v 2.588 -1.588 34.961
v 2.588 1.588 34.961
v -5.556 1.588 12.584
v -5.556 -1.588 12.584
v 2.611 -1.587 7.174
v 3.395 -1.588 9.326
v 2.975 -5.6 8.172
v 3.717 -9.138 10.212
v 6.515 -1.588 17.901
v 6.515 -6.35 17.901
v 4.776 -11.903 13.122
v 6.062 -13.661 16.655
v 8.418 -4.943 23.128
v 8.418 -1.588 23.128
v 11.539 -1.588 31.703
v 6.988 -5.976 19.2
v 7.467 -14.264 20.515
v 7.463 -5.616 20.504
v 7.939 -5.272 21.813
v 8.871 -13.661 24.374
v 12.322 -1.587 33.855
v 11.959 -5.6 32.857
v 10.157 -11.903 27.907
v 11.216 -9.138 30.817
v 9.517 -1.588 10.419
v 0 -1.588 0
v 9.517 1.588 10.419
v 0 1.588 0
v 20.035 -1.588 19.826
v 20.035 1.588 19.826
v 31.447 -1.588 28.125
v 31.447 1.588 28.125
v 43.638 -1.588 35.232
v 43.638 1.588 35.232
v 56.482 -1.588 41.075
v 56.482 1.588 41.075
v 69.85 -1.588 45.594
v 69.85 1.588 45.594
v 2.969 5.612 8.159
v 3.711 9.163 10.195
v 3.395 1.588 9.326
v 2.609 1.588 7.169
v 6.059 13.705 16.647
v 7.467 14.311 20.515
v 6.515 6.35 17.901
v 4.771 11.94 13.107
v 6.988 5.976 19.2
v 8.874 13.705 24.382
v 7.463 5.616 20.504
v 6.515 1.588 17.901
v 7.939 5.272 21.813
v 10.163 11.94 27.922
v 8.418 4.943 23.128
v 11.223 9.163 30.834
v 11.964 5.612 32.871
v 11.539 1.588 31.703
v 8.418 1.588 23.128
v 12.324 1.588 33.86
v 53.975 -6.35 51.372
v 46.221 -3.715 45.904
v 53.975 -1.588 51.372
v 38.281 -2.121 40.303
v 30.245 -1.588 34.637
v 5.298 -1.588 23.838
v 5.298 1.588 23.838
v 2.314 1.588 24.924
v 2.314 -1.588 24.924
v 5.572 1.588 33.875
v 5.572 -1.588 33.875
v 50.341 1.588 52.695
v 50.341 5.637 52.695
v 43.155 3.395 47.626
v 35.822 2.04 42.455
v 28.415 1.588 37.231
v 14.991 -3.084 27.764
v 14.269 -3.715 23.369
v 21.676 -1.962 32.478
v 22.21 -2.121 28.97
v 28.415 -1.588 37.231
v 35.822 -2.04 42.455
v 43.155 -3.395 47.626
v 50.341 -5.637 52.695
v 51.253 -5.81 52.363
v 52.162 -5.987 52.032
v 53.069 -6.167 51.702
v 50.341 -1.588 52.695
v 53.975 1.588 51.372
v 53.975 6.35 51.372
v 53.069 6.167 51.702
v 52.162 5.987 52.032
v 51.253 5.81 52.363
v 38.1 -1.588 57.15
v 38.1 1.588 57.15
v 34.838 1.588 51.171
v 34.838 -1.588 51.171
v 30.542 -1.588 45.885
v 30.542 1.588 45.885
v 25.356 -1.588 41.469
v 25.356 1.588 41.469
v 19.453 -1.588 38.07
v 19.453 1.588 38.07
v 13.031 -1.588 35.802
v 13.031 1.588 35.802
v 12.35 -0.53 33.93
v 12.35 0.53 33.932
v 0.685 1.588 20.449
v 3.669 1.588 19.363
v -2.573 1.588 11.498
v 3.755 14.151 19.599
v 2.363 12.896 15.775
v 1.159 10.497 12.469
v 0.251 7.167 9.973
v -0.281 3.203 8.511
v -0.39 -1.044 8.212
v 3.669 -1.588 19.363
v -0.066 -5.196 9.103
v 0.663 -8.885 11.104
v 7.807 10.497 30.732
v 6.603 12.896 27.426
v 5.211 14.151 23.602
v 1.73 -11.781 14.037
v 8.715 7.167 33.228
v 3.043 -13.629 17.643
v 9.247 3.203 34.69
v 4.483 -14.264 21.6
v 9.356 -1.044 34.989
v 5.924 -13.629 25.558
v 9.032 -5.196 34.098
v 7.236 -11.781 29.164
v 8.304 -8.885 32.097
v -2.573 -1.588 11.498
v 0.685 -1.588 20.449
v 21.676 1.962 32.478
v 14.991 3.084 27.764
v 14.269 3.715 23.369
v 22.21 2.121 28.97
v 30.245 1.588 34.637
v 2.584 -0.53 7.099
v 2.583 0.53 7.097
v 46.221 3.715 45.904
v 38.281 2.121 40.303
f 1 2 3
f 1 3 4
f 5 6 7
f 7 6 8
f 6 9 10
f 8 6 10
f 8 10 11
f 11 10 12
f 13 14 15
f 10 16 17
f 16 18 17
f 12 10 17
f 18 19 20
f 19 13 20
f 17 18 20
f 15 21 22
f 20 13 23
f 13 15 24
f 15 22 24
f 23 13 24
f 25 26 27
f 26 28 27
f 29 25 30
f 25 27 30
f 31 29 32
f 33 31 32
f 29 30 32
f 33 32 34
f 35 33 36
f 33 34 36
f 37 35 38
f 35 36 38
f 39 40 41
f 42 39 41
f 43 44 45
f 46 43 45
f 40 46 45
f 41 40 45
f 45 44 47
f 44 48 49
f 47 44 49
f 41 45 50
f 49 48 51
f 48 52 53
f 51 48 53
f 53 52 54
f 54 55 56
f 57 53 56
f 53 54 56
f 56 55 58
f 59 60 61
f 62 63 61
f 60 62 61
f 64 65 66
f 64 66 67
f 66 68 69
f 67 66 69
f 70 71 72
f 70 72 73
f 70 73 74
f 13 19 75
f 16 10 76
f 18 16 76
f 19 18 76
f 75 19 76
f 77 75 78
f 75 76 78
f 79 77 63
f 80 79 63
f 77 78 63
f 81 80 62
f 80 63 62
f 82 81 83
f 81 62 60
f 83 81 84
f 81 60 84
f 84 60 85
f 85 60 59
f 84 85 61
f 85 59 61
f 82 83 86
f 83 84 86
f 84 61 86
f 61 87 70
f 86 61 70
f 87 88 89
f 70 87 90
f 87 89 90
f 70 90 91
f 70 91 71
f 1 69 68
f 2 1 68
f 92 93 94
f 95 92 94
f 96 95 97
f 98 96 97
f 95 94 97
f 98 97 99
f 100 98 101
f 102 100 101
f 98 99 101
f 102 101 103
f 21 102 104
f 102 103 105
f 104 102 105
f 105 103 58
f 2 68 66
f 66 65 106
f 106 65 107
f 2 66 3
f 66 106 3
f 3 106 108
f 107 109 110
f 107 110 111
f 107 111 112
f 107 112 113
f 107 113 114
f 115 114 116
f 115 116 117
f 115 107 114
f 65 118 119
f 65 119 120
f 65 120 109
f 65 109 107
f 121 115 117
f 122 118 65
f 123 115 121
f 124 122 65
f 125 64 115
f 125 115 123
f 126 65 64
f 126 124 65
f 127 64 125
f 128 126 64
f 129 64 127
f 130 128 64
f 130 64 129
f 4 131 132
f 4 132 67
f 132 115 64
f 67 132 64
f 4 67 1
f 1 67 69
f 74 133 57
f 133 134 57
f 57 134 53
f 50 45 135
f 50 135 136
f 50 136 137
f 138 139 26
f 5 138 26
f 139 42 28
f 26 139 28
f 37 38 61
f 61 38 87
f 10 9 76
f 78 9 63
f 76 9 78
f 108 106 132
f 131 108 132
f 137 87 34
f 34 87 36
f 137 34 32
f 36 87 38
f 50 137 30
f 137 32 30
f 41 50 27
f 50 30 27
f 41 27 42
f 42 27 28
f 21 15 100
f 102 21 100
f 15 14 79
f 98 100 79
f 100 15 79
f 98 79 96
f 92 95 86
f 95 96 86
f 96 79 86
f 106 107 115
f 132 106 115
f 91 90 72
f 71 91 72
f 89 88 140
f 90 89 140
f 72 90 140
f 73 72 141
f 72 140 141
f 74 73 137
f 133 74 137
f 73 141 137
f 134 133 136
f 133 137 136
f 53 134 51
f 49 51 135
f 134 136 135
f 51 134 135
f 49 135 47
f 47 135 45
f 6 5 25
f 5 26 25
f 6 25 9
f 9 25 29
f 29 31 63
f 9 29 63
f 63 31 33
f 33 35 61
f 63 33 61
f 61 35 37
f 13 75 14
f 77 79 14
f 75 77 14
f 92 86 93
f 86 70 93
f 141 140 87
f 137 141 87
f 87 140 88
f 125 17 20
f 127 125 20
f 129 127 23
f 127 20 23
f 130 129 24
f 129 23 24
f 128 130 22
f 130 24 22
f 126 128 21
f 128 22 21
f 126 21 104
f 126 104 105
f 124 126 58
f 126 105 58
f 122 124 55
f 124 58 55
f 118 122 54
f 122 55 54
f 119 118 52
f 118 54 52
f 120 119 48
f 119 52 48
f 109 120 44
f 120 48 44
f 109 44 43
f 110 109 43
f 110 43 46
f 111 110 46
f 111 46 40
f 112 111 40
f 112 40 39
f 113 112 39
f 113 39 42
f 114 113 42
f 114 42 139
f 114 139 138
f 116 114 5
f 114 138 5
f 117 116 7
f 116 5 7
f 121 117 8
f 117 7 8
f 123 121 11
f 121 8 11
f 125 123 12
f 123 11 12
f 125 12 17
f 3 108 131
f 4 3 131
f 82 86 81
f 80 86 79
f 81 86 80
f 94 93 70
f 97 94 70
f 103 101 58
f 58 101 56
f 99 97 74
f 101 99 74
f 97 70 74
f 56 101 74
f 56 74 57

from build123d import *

# Parameters (mm, degrees)
F1_DEPTH      = 1.5875
F1_DEPTH_BACK = 1.5875
F2_DEPTH      = 6.35
F2_DEPTH_BACK = 6.35
F4_DEPTH      = 3.175
F7_DEPTH      = 9.525
F8_W          = 3.175
F8_H          = 9.525
F9_DEPTH      = 6.35
F10_R         = 14.2875
F11_DEPTH     = 3.175


with BuildPart() as f1:
    # F0 (on Front) → F1 (new body, two sides)
    with BuildSketch(Plane.XZ) as f1_sk:
        with BuildLine():
            Line((6.5154837304, 17.901144426), (0, 0))
            ThreePointArc((0, 0), (31.4472391318, 28.1249079907), (69.85, 45.593945062))
            Line((69.85, 45.593945062), (53.975, 51.371972531))
            Line((53.975, 51.371972531), (6.5154837304, 17.901144426))
        make_face()
    extrude(amount=-F1_DEPTH)
    extrude(f1_sk.sketch, amount=F1_DEPTH_BACK)


with BuildPart() as f1b:
    # F0 (on Front) → F1, piece 2 (new body, two sides)
    with BuildSketch(Plane.XZ) as f1_2_sk:
        with BuildLine():
            Line((13.0309674607, 35.8022888519), (8.4178990072, 23.1279874415))
            Line((8.4178990072, 23.1279874415), (50.3413574439, 52.6945102634))
            Line((50.3413574439, 52.6945102634), (38.1, 57.15))
            ThreePointArc((38.1, 57.15), (28.0500865293, 43.558427019), (13.0309674607, 35.8022888519))
        make_face()
    extrude(amount=-F1_DEPTH)
    extrude(f1_2_sk.sketch, amount=F1_DEPTH_BACK)


with BuildPart() as f2:
    # F0 (on Front) → F2 (new body, two sides)
    with BuildSketch(Plane.XZ) as f2_sk:
        Polygon((8.4178990072, 23.1279874415), (6.5154837304, 17.901144426), (53.975, 51.371972531), (50.3413574439, 52.6945102634), align=None)
    extrude(amount=-F2_DEPTH)
    extrude(f2_sk.sketch, amount=F2_DEPTH_BACK)

    # F3 (on face) → F4 (cut)
    with BuildSketch(Plane(origin=(-6.2670410681, 0, 8.8862676656), x_dir=(0.8172112207, 0, 0.5763382867), z_dir=(0.5763382867, 0, -0.8172112207))):
        with BuildLine():
            Line((73.7166102717, 6.35), (15.6416413214, 6.35))
            ThreePointArc((15.6416413214, 6.35), (44.6791257965, 1.5875), (73.7166102717, 6.35))
        make_face()
        with BuildLine():
            ThreePointArc((73.7166102717, -6.35), (44.6791257965, -1.5875), (15.6416413214, -6.35))
            Line((15.6416413214, -6.35), (73.7166102717, -6.35))
        make_face()
    extrude(amount=-F4_DEPTH, mode=Mode.SUBTRACT)


with BuildPart() as f1b_1:
    add(f1b.part)

    # F5: union F2, F1
    add(f2.part)
    add(f1.part)

    # F6 (on face) → F7 (join)
    with BuildSketch(Plane(origin=(0, 0, 0), x_dir=(0, -1, 0), z_dir=(-0.9396926208, 0, 0.3420201433))):
        Polygon((1.5875, 33.7373950786), (-1.5875, 33.7373950786), (-1.5875, 24.6122901573), (-1.5875, 19.05), (-1.5875, 9.9248950786), (1.5875, 9.9248950786), (1.5875, 19.05), (1.5875, 24.6122901573), align=None)
    extrude(amount=F7_DEPTH)

    # F8 (on face) → F9 (cut)
    with BuildSketch(Plane(origin=(0, 0, 0), x_dir=(0, -1, 0), z_dir=(-0.9396926208, 0, 0.3420201433))):
        with Locations((0, 28.9748950786)):
            Rectangle(F8_W, F8_H)
        with Locations((0, 14.6873950786)):
            Rectangle(F8_W, F8_H)
    extrude(amount=F9_DEPTH, mode=Mode.SUBTRACT)

    # F10 (on face) → F11 (join)
    with BuildSketch(Plane(origin=(0, 0, 0), x_dir=(0, -1, 0), z_dir=(-0.9396926208, 0, 0.3420201433))):
        with Locations((-0.0234540593, 21.8311450786)):
            Circle(F10_R)
        Polygon((-1.5875, 33.7373950786), (1.5875, 33.7373950786), (1.5875, 24.6122901573), (1.5875, 19.05), (1.5875, 9.9248950786), (-1.5875, 9.9248950786), (-1.5875, 19.05), (-1.5875, 24.6122901573), align=None, mode=Mode.SUBTRACT)
        Polygon((1.5875, 24.6122901573), (1.5875, 33.7373950786), (-1.5875, 33.7373950786), (-1.5875, 24.6122901573), (-1.5875, 19.05), (-1.5875, 9.9248950786), (1.5875, 9.9248950786), (1.5875, 19.05), align=None)
    extrude(amount=F11_DEPTH)


solid = f1b_1.part
